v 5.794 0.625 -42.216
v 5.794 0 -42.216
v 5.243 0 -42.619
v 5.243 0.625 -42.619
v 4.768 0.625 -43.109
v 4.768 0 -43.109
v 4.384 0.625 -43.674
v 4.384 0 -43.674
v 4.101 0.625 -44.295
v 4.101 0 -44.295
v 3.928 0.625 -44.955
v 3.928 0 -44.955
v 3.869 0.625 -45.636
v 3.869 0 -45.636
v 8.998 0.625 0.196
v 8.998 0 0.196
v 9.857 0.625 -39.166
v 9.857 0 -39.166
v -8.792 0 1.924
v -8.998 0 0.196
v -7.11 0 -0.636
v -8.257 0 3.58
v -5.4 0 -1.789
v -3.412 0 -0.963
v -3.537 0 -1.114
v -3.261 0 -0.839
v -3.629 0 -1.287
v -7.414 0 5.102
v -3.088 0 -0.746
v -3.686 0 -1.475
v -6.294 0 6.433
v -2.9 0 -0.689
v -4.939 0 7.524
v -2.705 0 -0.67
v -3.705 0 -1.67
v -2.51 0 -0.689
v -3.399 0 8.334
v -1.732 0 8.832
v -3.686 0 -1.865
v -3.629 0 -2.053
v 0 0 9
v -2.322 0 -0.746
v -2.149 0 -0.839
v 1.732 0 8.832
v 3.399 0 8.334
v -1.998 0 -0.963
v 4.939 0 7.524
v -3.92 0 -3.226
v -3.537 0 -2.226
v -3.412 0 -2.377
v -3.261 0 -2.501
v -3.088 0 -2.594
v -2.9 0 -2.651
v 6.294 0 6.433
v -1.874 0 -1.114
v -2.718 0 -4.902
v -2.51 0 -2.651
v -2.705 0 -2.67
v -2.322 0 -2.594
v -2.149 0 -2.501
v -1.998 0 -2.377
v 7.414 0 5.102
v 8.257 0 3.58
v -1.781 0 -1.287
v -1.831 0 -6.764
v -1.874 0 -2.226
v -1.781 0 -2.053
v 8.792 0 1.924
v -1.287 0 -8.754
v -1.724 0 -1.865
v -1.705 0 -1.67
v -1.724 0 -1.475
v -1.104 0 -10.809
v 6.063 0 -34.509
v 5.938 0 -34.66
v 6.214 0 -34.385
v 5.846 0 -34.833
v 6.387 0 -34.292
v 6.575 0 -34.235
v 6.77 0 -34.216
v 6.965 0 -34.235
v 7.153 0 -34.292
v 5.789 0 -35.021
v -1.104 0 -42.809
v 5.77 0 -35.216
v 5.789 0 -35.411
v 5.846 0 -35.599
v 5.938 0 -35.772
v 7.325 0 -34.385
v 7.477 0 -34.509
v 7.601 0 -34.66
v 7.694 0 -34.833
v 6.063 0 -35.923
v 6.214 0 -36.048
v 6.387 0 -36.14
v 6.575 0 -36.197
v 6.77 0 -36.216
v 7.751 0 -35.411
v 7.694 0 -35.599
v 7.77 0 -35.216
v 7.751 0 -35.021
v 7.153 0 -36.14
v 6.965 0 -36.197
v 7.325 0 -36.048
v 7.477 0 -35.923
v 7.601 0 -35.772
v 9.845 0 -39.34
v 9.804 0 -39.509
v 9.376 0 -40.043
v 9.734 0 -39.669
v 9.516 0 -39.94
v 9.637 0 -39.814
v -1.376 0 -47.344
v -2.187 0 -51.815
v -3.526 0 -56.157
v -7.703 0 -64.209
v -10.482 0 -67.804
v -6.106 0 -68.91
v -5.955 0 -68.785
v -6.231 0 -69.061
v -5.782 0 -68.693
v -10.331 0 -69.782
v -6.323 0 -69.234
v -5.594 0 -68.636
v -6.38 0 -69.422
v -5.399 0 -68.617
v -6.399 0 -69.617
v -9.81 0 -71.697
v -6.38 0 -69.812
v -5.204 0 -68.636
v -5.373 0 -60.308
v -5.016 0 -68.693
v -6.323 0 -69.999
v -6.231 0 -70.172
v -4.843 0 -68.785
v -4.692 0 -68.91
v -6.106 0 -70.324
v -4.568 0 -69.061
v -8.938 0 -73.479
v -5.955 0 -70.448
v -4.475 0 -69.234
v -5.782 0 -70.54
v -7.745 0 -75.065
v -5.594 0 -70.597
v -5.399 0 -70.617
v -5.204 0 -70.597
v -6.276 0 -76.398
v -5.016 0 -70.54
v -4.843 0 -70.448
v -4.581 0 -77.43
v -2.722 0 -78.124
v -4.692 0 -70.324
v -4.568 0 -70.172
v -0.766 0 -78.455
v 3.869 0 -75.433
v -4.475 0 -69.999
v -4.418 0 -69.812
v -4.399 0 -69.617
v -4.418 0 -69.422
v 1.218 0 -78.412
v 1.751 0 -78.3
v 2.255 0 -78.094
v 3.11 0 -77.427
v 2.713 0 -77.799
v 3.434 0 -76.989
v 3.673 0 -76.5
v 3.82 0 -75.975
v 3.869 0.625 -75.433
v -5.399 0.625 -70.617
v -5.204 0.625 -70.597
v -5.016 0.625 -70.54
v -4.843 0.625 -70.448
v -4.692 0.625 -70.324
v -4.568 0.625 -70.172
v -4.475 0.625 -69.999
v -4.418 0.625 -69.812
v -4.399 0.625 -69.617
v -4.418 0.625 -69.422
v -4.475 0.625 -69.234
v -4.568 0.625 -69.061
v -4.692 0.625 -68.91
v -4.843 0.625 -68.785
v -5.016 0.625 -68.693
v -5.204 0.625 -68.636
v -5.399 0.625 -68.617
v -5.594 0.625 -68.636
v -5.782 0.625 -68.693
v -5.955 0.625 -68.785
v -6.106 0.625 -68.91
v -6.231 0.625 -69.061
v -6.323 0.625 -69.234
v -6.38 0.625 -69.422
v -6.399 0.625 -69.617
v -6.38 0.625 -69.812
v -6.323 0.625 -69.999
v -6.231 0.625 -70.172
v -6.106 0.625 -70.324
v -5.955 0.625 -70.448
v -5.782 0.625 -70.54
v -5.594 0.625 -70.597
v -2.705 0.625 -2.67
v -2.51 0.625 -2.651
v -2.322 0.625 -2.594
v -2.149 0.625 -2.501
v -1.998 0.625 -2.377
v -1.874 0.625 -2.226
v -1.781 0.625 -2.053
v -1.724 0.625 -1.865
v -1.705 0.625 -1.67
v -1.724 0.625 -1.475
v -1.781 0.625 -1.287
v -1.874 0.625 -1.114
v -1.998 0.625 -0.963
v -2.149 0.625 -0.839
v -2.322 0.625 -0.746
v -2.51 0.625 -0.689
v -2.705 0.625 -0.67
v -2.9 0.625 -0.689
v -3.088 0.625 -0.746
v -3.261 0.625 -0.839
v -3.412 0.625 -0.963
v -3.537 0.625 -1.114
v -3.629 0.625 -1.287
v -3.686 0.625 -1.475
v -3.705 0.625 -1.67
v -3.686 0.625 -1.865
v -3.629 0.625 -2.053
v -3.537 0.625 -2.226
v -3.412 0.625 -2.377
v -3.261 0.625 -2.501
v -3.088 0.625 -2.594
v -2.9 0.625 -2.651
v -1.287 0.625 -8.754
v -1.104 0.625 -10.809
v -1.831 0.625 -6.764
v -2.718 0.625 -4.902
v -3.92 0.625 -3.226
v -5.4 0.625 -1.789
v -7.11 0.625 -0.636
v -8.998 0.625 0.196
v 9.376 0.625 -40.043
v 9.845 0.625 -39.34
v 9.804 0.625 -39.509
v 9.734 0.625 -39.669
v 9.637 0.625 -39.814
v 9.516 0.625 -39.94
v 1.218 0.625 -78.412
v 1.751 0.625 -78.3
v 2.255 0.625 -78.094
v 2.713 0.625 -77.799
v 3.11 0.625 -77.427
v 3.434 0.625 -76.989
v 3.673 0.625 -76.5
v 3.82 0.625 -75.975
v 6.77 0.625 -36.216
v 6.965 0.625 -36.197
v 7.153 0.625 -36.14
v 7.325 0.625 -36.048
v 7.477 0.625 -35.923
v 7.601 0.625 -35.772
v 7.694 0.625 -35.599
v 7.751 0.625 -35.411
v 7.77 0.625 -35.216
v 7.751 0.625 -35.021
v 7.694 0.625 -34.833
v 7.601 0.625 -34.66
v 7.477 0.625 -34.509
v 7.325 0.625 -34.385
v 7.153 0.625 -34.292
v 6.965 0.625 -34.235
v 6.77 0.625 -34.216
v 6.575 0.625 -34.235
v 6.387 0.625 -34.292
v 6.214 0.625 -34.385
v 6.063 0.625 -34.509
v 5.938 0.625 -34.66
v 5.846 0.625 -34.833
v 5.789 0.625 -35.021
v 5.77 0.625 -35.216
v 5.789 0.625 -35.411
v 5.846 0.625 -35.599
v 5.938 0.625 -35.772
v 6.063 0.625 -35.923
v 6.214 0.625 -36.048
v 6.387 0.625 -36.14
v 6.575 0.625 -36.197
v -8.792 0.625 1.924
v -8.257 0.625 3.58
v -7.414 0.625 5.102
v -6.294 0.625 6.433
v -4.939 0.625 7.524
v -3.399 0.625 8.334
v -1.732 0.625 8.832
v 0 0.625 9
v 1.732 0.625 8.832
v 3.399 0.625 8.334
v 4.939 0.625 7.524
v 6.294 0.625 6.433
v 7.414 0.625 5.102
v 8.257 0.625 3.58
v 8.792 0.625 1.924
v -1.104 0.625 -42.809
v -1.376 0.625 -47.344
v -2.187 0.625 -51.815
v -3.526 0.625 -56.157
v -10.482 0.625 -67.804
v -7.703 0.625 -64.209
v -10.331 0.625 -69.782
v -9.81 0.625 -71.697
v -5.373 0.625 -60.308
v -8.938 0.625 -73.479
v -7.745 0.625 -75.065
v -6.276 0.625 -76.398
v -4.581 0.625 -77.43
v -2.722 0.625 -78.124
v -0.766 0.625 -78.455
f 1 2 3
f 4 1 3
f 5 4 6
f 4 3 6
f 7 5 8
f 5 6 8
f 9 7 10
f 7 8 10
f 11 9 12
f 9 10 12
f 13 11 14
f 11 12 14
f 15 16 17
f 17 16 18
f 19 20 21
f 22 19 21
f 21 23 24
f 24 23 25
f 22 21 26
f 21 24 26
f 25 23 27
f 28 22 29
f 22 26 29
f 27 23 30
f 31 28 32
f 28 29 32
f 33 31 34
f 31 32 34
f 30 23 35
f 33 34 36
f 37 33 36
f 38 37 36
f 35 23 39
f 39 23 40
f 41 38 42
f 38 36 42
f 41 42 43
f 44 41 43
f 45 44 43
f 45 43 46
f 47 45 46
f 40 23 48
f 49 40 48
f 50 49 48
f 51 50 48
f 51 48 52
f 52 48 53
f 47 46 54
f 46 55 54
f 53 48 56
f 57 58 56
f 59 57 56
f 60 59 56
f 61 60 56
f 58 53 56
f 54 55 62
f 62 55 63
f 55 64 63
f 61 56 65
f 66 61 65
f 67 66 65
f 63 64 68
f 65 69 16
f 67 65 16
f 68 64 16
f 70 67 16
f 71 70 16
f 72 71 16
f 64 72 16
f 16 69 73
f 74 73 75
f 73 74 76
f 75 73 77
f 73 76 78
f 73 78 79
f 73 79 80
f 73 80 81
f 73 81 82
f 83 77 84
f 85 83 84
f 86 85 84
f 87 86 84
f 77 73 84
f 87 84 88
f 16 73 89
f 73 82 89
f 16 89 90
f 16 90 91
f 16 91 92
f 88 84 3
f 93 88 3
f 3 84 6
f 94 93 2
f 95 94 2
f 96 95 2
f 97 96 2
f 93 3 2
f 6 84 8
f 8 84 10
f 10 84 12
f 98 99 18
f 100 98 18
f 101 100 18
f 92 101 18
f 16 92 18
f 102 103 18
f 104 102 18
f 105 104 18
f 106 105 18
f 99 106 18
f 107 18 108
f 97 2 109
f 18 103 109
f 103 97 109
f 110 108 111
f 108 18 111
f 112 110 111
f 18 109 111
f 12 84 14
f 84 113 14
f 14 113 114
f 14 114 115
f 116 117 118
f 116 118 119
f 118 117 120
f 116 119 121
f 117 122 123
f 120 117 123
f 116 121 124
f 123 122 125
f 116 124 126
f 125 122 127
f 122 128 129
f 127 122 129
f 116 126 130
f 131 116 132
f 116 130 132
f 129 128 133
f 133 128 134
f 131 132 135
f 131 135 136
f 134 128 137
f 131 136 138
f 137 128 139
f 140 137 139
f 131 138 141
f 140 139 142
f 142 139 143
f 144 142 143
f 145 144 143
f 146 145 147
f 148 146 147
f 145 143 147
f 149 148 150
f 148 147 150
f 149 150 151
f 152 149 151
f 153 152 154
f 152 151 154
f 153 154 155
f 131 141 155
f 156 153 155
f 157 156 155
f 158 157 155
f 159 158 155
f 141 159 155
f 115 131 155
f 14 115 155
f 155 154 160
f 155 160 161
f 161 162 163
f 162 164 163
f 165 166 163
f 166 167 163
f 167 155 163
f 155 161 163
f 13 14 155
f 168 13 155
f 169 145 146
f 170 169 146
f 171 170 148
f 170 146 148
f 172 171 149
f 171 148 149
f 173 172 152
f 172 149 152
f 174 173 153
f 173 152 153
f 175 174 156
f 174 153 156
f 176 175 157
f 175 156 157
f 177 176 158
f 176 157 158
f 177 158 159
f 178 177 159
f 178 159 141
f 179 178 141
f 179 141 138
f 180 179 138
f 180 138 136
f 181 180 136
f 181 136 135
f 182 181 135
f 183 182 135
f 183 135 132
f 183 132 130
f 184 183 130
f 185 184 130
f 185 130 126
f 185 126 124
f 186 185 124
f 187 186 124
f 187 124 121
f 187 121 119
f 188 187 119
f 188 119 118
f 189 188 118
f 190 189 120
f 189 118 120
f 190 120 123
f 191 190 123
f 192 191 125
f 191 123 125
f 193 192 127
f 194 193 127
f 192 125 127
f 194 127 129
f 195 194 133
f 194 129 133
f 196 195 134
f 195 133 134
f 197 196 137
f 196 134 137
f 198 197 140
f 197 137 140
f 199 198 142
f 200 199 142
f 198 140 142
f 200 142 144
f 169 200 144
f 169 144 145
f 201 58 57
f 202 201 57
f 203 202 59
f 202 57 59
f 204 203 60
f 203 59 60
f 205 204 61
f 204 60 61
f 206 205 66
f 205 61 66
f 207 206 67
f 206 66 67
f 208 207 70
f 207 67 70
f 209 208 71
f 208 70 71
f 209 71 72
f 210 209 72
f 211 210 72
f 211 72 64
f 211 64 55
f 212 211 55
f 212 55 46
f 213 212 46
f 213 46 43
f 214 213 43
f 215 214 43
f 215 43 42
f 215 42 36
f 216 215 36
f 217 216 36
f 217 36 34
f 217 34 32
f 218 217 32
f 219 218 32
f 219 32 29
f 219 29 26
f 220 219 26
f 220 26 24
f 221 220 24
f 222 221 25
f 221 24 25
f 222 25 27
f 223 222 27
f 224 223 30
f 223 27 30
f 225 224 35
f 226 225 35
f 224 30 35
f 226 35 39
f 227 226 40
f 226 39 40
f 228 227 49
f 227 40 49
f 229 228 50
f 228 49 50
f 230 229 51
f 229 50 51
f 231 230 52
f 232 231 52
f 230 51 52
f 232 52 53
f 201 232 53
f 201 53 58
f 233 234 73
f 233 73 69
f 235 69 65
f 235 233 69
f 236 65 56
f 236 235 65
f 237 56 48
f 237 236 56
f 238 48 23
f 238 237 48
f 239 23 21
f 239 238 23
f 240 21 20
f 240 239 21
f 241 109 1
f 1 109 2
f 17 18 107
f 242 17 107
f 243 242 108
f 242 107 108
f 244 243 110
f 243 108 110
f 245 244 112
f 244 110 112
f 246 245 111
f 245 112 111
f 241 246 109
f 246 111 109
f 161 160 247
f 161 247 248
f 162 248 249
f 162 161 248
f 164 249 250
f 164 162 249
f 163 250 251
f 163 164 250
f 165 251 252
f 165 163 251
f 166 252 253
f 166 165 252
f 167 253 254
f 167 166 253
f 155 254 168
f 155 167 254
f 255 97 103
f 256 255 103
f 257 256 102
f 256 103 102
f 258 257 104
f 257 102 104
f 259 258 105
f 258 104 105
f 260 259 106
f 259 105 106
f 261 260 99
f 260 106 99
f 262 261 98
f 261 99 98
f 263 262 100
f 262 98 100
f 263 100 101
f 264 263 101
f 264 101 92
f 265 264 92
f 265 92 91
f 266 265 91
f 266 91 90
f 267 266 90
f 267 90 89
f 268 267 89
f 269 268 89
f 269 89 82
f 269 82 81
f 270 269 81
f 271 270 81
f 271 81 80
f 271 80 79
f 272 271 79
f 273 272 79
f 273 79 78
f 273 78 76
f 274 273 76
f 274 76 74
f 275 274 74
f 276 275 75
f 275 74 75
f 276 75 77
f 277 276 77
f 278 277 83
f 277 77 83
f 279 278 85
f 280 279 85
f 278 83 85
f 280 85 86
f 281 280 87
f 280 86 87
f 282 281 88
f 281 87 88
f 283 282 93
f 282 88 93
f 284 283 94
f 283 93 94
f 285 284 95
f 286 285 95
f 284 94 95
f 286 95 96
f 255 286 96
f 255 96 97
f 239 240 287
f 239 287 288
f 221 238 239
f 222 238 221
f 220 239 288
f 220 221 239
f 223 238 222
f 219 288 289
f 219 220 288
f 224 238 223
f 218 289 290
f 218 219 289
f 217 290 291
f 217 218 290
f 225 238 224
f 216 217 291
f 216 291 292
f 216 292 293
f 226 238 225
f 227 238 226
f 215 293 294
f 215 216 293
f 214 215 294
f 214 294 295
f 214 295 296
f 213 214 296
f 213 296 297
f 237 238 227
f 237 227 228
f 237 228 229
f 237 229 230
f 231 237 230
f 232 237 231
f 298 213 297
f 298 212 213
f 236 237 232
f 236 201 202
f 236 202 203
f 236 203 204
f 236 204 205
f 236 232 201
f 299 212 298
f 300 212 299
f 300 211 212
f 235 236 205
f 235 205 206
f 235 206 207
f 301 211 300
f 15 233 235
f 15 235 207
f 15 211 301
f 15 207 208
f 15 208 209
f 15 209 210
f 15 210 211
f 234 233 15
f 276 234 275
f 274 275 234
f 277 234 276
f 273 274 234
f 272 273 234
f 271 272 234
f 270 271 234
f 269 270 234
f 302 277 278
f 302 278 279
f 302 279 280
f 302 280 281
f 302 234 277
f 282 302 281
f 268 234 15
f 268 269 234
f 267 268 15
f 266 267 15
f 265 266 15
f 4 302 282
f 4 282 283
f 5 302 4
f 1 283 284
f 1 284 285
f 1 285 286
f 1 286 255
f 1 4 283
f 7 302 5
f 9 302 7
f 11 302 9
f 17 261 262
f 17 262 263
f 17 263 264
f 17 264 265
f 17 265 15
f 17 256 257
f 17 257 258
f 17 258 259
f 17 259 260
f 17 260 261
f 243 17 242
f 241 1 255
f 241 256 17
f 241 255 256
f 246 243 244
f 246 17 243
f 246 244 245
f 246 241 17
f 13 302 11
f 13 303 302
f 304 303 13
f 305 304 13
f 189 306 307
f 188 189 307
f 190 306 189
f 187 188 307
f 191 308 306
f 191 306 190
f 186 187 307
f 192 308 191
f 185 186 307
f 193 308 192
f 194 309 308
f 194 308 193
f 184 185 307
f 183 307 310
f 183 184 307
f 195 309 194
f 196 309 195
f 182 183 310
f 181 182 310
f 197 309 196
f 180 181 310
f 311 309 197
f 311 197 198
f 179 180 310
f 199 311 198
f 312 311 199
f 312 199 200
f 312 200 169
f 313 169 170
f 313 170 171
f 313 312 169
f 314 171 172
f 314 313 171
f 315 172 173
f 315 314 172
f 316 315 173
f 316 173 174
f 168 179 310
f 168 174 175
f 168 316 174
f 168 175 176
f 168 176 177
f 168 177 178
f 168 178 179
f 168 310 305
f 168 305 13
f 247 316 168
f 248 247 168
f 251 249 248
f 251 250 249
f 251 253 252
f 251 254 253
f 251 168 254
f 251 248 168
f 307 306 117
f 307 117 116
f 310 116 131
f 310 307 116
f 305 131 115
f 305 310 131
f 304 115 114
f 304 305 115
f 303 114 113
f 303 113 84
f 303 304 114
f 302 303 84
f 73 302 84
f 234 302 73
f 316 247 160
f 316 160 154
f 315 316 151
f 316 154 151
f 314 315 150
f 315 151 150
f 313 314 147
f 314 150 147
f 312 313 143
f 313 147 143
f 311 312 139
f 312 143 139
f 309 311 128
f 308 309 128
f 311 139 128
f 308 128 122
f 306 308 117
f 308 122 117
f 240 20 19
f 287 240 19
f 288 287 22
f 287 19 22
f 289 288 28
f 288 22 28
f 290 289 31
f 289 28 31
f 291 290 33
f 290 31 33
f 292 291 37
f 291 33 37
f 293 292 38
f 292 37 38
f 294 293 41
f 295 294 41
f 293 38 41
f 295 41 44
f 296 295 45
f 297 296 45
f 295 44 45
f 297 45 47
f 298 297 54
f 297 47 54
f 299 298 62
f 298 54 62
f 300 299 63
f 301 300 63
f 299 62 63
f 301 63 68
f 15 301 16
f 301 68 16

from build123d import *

# Parameters (mm, degrees)
BOSS_EXTRUDE1_DEPTH = 0.625
CUT_EXTRUDE3_DEPTH  = 0.625
FILLET1_START       = -1
FILLET1_DEPTH       = 3
CUT_EXTRUDE4_REACH  = 81.183
SKETCH5_R           = 1


with BuildPart() as part:
    # Sketch2 → Boss-Extrude1 (new body)
    with BuildSketch(Plane(origin=(0, 0, 0), x_dir=(1, 0, 0), z_dir=(0, 1, 0))):
        with BuildLine():
            Line((8.997858244, -0.196333965), (9.856747342, 39.165996151))
            ThreePointArc((9.856747342, 39.165996151), (9.733712071, 39.668799805), (9.375758573, 40.042722907))
            Line((9.375758573, 40.042722907), (5.794249139, 42.216036183))
            ThreePointArc((5.794249139, 42.216036183), (4.383630471, 43.673589393), (3.869342172, 45.635683666))
            Line((3.869342172, 45.635683666), (3.869342172, 77.038914875))
            ThreePointArc((3.869342172, 77.038914875), (3.676362717, 77.629438236), (3.171906493, 77.992043844))
            ThreePointArc((3.171906493, 77.992043844), (-6.282617519, 76.39229695), (-10.480917414, 67.771305568))
            Line((-10.480917414, 67.771305568), (-8.997858244, -0.196333965))
            ThreePointArc((-8.997858244, -0.196333965), (0, -9), (8.997858244, -0.196333965))
        make_face()
    extrude(amount=BOSS_EXTRUDE1_DEPTH)

    # Sketch3 → Cut-Extrude3 (cut)
    with BuildSketch(Plane(origin=(0, 0.625, 0), x_dir=(1, 0, 0), z_dir=(0, 1, 0))):
        with BuildLine():
            Line((-8.997858244, -0.196333965), (-10.481573544, 67.803666035))
            ThreePointArc((-10.481573544, 67.803666035), (-3.525742077, 56.156825546), (-1.104262014, 42.808832473))
            Line((-1.104262014, 42.808832473), (-1.104262014, 10.808832473))
            ThreePointArc((-1.104262014, 10.808832473), (-3.281700426, 4.037153402), (-8.997858244, -0.196333965))
        make_face()
    extrude(amount=-CUT_EXTRUDE3_DEPTH, mode=Mode.SUBTRACT)


with BuildPart() as body_2:
    # of the pieces the cut leaves, the one that is kept (cut_extrude3_keep)
    add(part.part.solids().sort_by_distance((8.997858244, 0, 0.196333965))[0])

    # Fillet1: read off the stored shape, not the designer's step
    # Fillet1 outline → Fillet1 (cut)
    with BuildSketch(Plane(origin=(0, 0, 0), x_dir=(1, 0, 0), z_dir=(0, 1, 0)).offset(FILLET1_START)):
        with BuildLine():
            ThreePointArc((3.171906493, 77.992043844), (2.204919962, 78.248915013), (1.217849838, 78.412433565))
            ThreePointArc((1.217849838, 78.412433565), (3.110493996, 77.427046766), (3.869342172, 75.432745259))
            Line((3.869342172, 75.432745259), (3.869342172, 77.038914875))
            ThreePointArc((3.869342172, 77.038914875), (3.676362717, 77.629438236), (3.171906493, 77.992043844))
        make_face()
    extrude(amount=FILLET1_DEPTH, mode=Mode.SUBTRACT)

    # Sketch5 → Cut-Extrude4 (cut, up to next)
    with BuildSketch(Plane.XZ, mode=Mode.PRIVATE) as cut_extrude4_sk1:
        with Locations(Location((-5.399070001, -69.616613762, 0), (0, 0, 270))):
            Circle(SKETCH5_R)
    cut_extrude4_tool1 = extrude(cut_extrude4_sk1.sketch, amount=-CUT_EXTRUDE4_REACH, mode=Mode.PRIVATE) & body_2.part
    # Sketch5 → Cut-Extrude4 (cut, up to next)
    with BuildSketch(Plane.XZ, mode=Mode.PRIVATE) as cut_extrude4_sk2:
        with Locations(Location((6.76984482, -35.216036183, 0), (0, 0, 270))):
            Circle(SKETCH5_R)
    cut_extrude4_tool2 = extrude(cut_extrude4_sk2.sketch, amount=-CUT_EXTRUDE4_REACH, mode=Mode.PRIVATE) & body_2.part
    # Sketch5 → Cut-Extrude4 (cut, up to next)
    with BuildSketch(Plane.XZ, mode=Mode.PRIVATE) as cut_extrude4_sk3:
        with Locations(Location((-2.705062156, -1.67, 0), (0, 0, 270))):
            Circle(SKETCH5_R)
    cut_extrude4_tool3 = extrude(cut_extrude4_sk3.sketch, amount=-CUT_EXTRUDE4_REACH, mode=Mode.PRIVATE) & body_2.part
    add(cut_extrude4_tool1.solids().sort_by_distance((-5.39907, 0, -69.616614))[0], mode=Mode.SUBTRACT)
    add(cut_extrude4_tool2.solids().sort_by_distance((6.769845, 0, -35.216036))[0], mode=Mode.SUBTRACT)
    add(cut_extrude4_tool3.solids().sort_by_distance((-2.705062, 0, -1.67))[0], mode=Mode.SUBTRACT)


solid = body_2.part
